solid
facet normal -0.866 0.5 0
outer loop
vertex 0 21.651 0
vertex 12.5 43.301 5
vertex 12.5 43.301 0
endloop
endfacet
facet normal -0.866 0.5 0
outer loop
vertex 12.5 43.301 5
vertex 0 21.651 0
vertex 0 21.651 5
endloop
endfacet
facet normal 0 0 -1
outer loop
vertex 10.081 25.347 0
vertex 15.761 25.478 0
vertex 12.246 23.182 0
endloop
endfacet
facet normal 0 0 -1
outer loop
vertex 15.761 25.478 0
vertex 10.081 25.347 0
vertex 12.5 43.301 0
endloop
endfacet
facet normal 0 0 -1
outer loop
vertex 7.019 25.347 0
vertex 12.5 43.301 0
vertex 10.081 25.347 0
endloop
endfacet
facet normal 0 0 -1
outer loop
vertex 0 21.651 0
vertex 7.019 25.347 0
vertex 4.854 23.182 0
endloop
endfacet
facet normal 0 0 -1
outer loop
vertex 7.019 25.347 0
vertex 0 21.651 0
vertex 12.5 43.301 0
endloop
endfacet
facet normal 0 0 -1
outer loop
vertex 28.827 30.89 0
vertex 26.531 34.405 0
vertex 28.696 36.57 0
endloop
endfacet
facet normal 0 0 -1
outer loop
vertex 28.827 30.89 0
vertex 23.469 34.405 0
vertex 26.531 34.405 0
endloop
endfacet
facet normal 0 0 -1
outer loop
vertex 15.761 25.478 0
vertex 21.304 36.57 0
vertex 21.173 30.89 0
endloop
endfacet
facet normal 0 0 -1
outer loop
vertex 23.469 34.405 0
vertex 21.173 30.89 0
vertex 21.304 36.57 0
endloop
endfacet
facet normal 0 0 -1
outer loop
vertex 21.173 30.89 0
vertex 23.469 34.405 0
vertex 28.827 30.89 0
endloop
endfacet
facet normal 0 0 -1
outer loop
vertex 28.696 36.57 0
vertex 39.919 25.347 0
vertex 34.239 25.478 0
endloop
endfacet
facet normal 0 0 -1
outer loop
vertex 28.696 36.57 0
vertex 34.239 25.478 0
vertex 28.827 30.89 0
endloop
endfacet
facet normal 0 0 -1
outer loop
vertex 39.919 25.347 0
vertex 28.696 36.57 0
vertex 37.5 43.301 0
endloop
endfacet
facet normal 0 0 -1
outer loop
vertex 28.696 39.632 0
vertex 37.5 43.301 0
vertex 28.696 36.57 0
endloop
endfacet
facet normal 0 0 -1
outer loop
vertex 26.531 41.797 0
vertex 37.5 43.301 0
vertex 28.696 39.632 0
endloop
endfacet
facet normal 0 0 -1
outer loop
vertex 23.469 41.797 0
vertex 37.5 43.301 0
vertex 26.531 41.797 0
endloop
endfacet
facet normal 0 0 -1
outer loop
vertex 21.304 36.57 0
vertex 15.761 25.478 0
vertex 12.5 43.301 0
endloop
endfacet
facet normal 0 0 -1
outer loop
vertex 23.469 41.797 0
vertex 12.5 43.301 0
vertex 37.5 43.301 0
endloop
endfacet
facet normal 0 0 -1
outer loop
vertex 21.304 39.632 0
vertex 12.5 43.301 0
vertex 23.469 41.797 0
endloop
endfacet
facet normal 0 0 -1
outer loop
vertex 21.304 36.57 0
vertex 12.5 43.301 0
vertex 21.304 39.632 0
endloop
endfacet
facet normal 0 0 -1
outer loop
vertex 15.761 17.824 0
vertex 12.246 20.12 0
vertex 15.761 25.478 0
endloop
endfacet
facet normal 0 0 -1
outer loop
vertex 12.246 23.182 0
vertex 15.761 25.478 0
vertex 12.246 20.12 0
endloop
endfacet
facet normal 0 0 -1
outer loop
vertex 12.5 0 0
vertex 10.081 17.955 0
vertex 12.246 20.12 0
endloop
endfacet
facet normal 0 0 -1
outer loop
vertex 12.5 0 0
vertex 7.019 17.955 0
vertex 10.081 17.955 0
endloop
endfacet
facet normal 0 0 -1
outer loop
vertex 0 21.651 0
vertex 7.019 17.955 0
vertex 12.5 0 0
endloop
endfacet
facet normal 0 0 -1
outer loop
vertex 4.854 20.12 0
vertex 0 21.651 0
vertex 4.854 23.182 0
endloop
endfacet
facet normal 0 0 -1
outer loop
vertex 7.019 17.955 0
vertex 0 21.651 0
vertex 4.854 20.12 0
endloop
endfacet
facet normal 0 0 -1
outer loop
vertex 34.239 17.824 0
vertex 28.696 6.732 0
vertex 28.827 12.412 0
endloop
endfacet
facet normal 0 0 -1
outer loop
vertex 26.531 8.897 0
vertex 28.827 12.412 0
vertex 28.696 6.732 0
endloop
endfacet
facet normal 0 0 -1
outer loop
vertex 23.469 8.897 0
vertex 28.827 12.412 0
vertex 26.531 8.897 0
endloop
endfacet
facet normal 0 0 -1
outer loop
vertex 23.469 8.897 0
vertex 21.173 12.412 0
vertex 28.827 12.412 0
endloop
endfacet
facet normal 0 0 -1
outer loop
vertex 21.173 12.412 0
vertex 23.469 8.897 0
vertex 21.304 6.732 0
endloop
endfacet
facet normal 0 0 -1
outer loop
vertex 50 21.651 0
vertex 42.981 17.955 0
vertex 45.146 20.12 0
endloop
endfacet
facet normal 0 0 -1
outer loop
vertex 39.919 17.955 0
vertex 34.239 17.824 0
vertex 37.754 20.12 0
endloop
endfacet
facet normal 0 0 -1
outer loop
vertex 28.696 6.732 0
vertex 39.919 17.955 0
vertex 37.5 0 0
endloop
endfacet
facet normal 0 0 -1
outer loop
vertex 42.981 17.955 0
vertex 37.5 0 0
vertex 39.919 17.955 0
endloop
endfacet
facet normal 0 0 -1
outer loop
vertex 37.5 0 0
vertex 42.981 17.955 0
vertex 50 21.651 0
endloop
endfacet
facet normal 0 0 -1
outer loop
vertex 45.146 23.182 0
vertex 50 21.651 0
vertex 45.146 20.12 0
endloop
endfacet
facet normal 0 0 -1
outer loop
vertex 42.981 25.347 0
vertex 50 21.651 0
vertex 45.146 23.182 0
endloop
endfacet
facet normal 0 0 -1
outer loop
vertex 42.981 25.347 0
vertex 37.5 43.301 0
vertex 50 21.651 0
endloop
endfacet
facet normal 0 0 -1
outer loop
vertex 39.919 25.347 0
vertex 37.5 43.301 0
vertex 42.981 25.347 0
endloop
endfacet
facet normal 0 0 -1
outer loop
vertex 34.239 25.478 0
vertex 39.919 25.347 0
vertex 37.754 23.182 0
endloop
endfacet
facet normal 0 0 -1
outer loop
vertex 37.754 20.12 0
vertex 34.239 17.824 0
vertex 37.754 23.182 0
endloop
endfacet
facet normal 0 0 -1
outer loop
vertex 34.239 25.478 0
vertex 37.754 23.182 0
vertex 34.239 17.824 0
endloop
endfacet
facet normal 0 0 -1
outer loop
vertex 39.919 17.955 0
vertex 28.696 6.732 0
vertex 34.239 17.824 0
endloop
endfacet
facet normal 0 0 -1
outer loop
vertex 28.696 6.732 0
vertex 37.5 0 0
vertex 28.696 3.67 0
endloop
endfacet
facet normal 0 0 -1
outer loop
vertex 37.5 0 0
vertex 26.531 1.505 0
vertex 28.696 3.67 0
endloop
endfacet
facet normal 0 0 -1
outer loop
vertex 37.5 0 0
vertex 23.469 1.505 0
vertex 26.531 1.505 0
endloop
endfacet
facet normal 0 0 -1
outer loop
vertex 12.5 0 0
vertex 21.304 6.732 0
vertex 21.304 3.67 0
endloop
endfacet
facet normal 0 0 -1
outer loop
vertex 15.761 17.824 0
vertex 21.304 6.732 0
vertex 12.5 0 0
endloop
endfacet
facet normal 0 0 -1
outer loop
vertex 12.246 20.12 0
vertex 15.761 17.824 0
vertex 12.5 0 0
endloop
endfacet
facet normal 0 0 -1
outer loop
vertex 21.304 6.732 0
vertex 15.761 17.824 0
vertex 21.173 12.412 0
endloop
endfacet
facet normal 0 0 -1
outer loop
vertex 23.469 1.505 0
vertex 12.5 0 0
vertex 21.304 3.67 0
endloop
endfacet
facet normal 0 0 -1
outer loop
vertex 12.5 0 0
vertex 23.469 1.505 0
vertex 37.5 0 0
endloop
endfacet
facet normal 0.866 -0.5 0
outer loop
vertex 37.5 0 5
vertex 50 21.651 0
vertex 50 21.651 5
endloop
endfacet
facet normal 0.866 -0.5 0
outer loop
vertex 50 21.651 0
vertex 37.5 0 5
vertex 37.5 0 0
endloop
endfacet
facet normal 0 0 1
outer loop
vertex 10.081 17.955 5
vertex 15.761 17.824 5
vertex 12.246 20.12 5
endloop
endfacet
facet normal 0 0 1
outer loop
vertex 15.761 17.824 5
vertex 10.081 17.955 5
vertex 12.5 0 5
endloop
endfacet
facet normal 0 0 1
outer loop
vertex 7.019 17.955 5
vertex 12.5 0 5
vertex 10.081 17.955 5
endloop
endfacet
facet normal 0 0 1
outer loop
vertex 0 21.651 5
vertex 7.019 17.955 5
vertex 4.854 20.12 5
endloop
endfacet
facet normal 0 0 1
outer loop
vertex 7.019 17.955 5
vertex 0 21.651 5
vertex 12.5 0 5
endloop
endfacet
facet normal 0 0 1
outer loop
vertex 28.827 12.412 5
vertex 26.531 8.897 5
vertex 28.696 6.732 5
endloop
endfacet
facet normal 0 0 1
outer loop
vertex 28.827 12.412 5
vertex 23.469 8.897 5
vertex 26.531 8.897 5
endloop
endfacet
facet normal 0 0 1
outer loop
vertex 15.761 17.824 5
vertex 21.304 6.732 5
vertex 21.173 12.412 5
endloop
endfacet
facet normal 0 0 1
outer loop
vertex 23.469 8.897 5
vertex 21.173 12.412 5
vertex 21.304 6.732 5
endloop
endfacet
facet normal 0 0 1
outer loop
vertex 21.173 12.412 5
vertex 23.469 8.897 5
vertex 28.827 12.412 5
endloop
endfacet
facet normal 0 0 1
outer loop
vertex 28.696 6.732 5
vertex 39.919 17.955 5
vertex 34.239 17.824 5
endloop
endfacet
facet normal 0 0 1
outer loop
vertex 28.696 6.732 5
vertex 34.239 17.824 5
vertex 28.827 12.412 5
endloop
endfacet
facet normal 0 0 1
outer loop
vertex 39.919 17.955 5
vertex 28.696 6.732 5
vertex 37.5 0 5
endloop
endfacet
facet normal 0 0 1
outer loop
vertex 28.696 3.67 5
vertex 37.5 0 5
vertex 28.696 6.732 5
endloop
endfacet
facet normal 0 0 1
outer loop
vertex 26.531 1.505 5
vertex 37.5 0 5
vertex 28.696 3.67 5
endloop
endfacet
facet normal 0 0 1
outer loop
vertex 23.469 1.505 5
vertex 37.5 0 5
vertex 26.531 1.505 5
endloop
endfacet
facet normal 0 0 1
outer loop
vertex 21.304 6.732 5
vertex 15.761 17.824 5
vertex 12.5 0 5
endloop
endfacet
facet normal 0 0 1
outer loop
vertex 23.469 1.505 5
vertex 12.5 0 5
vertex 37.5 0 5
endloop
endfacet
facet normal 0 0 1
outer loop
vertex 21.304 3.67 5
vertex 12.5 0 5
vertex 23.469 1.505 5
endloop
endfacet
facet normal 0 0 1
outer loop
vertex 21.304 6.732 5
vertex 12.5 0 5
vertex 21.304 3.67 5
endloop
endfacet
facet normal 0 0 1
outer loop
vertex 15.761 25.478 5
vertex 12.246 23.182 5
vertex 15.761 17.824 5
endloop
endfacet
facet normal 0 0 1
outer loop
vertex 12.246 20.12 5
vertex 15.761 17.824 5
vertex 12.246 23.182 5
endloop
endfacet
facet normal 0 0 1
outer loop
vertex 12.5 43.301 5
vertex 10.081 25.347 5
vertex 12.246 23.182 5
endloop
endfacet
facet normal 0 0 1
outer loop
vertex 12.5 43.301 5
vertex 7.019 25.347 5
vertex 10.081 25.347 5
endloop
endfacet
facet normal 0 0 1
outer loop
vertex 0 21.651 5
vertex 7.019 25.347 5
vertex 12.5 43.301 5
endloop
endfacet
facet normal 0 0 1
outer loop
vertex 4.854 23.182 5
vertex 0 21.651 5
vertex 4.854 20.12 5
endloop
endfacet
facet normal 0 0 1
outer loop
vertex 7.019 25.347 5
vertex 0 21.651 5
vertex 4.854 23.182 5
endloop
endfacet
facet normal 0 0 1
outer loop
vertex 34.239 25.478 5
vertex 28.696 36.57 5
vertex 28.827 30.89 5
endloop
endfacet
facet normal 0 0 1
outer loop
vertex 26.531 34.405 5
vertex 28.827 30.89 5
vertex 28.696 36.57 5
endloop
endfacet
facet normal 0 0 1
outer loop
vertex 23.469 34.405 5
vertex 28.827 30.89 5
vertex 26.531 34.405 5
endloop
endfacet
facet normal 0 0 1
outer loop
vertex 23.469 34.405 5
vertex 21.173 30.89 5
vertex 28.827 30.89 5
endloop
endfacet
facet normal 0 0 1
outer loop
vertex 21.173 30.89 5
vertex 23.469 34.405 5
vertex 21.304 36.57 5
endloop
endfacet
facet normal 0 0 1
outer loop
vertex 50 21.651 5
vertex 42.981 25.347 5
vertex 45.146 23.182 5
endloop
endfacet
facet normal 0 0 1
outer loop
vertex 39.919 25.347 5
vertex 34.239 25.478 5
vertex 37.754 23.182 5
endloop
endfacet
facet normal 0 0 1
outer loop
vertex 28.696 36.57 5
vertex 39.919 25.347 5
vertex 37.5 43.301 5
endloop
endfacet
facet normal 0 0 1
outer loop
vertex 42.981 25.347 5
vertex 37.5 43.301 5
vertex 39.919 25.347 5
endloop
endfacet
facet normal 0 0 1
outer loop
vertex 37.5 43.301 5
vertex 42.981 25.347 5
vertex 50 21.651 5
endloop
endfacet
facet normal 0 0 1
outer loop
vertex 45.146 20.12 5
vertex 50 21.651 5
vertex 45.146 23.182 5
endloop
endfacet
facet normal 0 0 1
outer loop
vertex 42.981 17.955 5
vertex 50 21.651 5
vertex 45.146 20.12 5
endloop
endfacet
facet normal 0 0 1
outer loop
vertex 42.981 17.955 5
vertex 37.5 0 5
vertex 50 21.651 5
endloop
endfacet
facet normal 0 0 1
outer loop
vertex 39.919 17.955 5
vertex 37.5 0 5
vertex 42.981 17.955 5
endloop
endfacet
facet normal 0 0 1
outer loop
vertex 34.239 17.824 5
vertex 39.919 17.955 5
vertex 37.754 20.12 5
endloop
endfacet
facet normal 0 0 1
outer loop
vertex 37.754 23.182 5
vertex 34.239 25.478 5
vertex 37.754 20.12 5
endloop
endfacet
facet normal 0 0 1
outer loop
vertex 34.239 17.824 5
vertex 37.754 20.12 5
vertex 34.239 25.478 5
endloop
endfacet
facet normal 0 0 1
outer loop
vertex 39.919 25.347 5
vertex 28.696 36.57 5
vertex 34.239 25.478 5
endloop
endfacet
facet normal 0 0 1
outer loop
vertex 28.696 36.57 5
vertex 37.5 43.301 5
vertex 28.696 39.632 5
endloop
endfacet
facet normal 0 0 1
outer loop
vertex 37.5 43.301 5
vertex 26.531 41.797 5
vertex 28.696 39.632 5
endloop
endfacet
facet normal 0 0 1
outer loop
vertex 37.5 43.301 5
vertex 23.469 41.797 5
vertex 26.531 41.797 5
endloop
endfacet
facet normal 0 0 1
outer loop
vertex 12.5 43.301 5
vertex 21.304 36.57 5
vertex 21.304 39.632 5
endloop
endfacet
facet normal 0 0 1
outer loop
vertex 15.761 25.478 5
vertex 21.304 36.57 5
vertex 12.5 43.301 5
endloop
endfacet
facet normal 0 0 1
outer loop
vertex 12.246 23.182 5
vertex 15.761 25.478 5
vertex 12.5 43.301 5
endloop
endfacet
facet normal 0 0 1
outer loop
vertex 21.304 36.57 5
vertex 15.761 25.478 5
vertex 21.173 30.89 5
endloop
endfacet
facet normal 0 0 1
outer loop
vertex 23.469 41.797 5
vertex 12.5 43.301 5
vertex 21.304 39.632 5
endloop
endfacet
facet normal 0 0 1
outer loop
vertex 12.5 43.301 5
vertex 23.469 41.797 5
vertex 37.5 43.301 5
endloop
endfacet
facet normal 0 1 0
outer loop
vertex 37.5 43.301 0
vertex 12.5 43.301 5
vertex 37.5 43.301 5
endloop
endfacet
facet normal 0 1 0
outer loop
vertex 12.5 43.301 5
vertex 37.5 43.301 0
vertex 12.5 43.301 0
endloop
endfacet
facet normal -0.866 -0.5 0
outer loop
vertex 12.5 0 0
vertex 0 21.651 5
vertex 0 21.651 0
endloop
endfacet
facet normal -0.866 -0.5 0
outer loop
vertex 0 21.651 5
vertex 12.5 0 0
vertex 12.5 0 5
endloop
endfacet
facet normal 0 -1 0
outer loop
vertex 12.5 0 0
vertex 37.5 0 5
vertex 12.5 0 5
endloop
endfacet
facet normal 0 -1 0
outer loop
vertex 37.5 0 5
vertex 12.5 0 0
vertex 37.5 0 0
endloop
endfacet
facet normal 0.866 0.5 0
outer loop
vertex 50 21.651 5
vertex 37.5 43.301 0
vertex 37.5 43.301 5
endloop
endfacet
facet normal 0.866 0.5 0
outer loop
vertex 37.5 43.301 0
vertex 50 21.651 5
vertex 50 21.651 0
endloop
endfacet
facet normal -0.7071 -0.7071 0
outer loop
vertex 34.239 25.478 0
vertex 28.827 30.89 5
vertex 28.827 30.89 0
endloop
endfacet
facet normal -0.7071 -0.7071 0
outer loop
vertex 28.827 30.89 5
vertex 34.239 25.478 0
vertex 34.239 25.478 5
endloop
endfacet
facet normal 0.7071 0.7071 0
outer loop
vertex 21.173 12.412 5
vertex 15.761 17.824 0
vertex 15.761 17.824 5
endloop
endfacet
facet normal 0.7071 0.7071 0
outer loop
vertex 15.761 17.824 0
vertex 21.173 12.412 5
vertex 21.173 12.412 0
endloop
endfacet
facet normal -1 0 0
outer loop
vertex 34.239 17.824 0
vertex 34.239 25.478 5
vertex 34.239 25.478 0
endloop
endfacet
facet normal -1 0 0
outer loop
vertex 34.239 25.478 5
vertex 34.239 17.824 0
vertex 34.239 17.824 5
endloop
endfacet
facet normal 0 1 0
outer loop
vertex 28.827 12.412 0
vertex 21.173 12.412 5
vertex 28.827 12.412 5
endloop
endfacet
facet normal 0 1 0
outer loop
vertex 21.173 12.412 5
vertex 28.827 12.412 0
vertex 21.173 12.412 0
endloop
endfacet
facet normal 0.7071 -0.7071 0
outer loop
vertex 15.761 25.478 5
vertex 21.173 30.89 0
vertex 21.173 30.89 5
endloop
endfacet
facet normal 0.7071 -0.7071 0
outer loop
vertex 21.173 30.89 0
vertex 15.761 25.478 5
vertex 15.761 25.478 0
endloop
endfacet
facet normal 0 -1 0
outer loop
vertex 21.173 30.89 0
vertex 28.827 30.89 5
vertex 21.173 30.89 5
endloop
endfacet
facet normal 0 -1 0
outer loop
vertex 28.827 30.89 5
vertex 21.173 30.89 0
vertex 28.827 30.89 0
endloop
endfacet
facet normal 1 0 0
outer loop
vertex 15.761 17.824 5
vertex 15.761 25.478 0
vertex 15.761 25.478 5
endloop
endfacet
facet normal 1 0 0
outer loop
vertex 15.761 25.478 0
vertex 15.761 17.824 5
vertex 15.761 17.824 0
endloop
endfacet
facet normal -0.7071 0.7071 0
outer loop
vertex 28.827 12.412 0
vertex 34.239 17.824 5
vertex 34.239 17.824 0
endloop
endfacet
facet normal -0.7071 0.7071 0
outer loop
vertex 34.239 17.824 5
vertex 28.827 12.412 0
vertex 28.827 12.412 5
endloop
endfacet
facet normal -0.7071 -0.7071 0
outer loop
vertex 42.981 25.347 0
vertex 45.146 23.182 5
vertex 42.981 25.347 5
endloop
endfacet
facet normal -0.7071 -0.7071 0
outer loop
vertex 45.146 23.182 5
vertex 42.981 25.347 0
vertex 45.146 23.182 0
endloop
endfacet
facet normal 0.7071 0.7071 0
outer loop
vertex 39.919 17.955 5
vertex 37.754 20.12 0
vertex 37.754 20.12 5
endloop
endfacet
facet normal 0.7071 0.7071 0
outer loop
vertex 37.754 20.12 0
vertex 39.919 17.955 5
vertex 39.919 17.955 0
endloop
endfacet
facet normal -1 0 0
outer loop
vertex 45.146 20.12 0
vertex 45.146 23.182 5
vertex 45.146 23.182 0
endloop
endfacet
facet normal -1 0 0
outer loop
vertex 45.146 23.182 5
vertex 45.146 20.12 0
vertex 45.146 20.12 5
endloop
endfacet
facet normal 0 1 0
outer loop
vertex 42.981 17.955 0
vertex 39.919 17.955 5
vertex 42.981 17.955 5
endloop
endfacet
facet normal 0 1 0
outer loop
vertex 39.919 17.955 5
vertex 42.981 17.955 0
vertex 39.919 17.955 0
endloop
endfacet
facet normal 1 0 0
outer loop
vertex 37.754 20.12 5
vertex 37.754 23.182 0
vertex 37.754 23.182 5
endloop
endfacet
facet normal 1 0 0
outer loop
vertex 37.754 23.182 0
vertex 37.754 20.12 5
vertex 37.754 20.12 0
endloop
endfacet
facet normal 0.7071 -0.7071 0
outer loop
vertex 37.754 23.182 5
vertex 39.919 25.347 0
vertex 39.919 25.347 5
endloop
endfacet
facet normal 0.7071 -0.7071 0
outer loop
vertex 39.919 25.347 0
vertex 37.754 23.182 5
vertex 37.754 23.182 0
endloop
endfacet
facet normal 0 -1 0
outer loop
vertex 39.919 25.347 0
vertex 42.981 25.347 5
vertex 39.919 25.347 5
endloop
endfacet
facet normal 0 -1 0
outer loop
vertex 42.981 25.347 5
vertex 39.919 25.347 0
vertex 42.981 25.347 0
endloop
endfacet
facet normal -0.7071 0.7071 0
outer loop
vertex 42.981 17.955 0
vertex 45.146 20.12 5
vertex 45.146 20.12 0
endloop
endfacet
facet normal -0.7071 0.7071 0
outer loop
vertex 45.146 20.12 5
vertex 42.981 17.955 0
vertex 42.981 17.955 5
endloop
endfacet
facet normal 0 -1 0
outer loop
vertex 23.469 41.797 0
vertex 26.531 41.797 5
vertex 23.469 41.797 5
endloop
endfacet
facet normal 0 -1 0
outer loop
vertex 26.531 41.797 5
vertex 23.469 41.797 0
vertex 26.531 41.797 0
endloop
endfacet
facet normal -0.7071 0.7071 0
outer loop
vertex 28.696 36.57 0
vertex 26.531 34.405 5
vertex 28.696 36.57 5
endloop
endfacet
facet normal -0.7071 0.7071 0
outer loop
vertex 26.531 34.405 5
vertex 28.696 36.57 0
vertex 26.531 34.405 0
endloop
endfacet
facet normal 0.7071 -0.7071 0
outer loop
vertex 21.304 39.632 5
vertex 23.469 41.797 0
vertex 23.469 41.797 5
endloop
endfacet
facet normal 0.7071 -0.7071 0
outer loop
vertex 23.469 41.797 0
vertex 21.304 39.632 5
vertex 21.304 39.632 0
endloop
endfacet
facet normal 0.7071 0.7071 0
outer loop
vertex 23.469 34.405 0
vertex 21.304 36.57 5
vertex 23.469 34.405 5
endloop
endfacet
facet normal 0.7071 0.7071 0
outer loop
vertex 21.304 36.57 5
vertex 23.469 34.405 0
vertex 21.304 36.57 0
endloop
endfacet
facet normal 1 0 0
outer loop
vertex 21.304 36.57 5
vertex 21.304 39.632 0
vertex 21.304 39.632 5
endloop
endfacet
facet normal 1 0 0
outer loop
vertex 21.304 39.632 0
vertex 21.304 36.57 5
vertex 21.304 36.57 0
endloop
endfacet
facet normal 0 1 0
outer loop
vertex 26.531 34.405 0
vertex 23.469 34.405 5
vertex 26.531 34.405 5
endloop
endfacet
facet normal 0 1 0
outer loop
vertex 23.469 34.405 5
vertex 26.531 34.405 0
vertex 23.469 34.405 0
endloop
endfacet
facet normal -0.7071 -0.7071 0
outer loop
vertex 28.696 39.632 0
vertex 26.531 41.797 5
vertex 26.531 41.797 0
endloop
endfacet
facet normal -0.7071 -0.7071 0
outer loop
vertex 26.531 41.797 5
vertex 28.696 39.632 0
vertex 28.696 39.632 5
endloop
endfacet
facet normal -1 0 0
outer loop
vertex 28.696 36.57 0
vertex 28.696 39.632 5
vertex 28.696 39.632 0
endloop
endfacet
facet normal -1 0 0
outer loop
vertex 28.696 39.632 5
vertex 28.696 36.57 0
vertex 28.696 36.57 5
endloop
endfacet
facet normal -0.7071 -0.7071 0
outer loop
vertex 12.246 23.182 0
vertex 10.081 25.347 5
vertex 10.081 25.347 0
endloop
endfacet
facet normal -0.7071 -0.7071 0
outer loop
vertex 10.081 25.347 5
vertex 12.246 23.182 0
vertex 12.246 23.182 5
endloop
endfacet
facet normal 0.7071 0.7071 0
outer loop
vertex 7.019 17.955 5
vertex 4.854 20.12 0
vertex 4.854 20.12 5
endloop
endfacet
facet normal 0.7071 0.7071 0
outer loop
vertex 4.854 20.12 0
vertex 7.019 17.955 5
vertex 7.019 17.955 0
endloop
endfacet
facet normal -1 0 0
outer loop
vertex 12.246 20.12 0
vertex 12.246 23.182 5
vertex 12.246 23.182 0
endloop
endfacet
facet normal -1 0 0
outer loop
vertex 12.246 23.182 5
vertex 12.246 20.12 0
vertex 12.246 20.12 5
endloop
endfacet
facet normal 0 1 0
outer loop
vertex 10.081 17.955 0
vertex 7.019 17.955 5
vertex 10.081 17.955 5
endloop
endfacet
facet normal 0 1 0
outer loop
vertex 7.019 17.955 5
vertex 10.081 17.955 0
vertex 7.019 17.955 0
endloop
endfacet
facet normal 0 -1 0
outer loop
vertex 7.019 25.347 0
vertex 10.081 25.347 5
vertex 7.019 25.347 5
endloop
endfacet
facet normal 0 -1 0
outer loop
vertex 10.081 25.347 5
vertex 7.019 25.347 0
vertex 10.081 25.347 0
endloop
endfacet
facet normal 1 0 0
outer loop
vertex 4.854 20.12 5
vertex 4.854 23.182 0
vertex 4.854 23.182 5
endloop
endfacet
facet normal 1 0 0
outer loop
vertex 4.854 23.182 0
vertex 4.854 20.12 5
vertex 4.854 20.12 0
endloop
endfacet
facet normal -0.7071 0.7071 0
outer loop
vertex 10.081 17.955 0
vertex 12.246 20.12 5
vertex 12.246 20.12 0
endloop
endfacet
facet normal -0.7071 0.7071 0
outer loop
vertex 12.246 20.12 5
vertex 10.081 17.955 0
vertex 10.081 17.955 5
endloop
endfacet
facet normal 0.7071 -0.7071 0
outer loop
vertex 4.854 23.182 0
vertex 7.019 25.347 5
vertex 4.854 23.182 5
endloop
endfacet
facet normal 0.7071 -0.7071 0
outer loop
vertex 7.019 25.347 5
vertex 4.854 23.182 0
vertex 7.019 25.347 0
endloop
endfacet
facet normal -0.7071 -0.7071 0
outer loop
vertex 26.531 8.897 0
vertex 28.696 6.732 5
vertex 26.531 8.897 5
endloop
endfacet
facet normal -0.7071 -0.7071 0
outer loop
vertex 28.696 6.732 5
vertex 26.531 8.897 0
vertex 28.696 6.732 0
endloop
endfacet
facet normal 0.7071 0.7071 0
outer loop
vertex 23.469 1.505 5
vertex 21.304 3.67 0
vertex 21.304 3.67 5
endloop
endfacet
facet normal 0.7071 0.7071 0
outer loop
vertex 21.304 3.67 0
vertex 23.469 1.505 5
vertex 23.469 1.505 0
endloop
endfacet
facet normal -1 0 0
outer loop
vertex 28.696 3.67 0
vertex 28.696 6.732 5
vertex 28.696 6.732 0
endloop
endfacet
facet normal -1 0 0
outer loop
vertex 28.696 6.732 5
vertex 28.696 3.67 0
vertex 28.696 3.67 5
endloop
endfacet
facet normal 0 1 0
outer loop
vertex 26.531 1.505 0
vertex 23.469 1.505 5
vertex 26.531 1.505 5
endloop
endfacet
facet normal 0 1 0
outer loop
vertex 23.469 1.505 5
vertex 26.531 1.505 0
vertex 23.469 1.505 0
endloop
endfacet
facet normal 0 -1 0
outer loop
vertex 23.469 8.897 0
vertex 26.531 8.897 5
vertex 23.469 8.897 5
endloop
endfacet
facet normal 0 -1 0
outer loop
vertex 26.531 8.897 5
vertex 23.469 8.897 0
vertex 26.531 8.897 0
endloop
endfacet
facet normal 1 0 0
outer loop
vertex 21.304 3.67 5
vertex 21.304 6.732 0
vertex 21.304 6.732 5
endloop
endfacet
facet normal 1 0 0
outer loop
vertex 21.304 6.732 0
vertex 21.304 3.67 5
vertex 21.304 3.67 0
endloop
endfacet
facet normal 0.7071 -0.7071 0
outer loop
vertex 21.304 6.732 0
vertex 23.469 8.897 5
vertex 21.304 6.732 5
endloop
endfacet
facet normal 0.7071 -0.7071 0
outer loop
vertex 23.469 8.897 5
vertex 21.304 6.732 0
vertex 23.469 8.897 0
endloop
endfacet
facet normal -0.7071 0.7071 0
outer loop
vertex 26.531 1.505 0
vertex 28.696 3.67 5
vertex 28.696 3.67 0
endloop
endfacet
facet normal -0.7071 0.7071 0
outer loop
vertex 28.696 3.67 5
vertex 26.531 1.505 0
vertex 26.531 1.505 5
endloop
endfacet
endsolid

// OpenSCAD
$fn = 32;

// ----------------------------------------------------------------------
// Polygon plate: 6-gon R25, 4 bolt windows
// ----------------------------------------------------------------------

// --- parameters (mm) ---
sides = 6;                // number of polygon sides
plate_r = 25;             // circumscribed radius of the polygon
bore_r = 10;              // centre bore radius
bolts = 4;                // number of bolt windows
ring_r = 16.45;           // bolt-circle radius
bolt_r = 4;               // bolt window radius
plate_t = 5;              // plate thickness, Z (extrusion height)

plate_d = 2 * plate_r;  // circumscribed diameter
bore_d = 2 * bore_r;  // centre bore diameter
bolt_d = 2 * bolt_r;  // bolt window diameter
ring_d = 2 * ring_r;  // bolt-circle diameter

profile = [[50, 21.651], [37.5, 43.301], [12.5, 43.301], [0, 21.651], [12.5, 0], [37.5, 0]];  // primary outline, 6 points, counter clockwise
void_1 = [[34.239, 25.478], [28.827, 30.89], [21.173, 30.89], [15.761, 25.478], [15.761, 17.824], [21.173, 12.412], [28.827, 12.412], [34.239, 17.824]];  // centre bore, 8 points
void_2 = [[45.146, 23.182], [42.981, 25.347], [39.919, 25.347], [37.754, 23.182], [37.754, 20.12], [39.919, 17.955], [42.981, 17.955], [45.146, 20.12]];  // bolt window 1, 8 points
void_3 = [[28.696, 39.632], [26.531, 41.797], [23.469, 41.797], [21.304, 39.632], [21.304, 36.57], [23.469, 34.405], [26.531, 34.405], [28.696, 36.57]];  // bolt window 2, 8 points
void_4 = [[12.246, 23.182], [10.081, 25.347], [7.019, 25.347], [4.854, 23.182], [4.854, 20.12], [7.019, 17.955], [10.081, 17.955], [12.246, 20.12]];  // bolt window 3, 8 points
void_5 = [[28.696, 6.732], [26.531, 8.897], [23.469, 8.897], [21.304, 6.732], [21.304, 3.67], [23.469, 1.505], [26.531, 1.505], [28.696, 3.67]];  // bolt window 4, 8 points

// --- the one profile operation ---
difference() {
  linear_extrude(height = plate_t) polygon(points = profile);
  translate([0, 0, -1])
    linear_extrude(height = plate_t + 2) polygon(points = void_1);
  translate([0, 0, -1])
    linear_extrude(height = plate_t + 2) polygon(points = void_2);
  translate([0, 0, -1])
    linear_extrude(height = plate_t + 2) polygon(points = void_3);
  translate([0, 0, -1])
    linear_extrude(height = plate_t + 2) polygon(points = void_4);
  translate([0, 0, -1])
    linear_extrude(height = plate_t + 2) polygon(points = void_5);
}
